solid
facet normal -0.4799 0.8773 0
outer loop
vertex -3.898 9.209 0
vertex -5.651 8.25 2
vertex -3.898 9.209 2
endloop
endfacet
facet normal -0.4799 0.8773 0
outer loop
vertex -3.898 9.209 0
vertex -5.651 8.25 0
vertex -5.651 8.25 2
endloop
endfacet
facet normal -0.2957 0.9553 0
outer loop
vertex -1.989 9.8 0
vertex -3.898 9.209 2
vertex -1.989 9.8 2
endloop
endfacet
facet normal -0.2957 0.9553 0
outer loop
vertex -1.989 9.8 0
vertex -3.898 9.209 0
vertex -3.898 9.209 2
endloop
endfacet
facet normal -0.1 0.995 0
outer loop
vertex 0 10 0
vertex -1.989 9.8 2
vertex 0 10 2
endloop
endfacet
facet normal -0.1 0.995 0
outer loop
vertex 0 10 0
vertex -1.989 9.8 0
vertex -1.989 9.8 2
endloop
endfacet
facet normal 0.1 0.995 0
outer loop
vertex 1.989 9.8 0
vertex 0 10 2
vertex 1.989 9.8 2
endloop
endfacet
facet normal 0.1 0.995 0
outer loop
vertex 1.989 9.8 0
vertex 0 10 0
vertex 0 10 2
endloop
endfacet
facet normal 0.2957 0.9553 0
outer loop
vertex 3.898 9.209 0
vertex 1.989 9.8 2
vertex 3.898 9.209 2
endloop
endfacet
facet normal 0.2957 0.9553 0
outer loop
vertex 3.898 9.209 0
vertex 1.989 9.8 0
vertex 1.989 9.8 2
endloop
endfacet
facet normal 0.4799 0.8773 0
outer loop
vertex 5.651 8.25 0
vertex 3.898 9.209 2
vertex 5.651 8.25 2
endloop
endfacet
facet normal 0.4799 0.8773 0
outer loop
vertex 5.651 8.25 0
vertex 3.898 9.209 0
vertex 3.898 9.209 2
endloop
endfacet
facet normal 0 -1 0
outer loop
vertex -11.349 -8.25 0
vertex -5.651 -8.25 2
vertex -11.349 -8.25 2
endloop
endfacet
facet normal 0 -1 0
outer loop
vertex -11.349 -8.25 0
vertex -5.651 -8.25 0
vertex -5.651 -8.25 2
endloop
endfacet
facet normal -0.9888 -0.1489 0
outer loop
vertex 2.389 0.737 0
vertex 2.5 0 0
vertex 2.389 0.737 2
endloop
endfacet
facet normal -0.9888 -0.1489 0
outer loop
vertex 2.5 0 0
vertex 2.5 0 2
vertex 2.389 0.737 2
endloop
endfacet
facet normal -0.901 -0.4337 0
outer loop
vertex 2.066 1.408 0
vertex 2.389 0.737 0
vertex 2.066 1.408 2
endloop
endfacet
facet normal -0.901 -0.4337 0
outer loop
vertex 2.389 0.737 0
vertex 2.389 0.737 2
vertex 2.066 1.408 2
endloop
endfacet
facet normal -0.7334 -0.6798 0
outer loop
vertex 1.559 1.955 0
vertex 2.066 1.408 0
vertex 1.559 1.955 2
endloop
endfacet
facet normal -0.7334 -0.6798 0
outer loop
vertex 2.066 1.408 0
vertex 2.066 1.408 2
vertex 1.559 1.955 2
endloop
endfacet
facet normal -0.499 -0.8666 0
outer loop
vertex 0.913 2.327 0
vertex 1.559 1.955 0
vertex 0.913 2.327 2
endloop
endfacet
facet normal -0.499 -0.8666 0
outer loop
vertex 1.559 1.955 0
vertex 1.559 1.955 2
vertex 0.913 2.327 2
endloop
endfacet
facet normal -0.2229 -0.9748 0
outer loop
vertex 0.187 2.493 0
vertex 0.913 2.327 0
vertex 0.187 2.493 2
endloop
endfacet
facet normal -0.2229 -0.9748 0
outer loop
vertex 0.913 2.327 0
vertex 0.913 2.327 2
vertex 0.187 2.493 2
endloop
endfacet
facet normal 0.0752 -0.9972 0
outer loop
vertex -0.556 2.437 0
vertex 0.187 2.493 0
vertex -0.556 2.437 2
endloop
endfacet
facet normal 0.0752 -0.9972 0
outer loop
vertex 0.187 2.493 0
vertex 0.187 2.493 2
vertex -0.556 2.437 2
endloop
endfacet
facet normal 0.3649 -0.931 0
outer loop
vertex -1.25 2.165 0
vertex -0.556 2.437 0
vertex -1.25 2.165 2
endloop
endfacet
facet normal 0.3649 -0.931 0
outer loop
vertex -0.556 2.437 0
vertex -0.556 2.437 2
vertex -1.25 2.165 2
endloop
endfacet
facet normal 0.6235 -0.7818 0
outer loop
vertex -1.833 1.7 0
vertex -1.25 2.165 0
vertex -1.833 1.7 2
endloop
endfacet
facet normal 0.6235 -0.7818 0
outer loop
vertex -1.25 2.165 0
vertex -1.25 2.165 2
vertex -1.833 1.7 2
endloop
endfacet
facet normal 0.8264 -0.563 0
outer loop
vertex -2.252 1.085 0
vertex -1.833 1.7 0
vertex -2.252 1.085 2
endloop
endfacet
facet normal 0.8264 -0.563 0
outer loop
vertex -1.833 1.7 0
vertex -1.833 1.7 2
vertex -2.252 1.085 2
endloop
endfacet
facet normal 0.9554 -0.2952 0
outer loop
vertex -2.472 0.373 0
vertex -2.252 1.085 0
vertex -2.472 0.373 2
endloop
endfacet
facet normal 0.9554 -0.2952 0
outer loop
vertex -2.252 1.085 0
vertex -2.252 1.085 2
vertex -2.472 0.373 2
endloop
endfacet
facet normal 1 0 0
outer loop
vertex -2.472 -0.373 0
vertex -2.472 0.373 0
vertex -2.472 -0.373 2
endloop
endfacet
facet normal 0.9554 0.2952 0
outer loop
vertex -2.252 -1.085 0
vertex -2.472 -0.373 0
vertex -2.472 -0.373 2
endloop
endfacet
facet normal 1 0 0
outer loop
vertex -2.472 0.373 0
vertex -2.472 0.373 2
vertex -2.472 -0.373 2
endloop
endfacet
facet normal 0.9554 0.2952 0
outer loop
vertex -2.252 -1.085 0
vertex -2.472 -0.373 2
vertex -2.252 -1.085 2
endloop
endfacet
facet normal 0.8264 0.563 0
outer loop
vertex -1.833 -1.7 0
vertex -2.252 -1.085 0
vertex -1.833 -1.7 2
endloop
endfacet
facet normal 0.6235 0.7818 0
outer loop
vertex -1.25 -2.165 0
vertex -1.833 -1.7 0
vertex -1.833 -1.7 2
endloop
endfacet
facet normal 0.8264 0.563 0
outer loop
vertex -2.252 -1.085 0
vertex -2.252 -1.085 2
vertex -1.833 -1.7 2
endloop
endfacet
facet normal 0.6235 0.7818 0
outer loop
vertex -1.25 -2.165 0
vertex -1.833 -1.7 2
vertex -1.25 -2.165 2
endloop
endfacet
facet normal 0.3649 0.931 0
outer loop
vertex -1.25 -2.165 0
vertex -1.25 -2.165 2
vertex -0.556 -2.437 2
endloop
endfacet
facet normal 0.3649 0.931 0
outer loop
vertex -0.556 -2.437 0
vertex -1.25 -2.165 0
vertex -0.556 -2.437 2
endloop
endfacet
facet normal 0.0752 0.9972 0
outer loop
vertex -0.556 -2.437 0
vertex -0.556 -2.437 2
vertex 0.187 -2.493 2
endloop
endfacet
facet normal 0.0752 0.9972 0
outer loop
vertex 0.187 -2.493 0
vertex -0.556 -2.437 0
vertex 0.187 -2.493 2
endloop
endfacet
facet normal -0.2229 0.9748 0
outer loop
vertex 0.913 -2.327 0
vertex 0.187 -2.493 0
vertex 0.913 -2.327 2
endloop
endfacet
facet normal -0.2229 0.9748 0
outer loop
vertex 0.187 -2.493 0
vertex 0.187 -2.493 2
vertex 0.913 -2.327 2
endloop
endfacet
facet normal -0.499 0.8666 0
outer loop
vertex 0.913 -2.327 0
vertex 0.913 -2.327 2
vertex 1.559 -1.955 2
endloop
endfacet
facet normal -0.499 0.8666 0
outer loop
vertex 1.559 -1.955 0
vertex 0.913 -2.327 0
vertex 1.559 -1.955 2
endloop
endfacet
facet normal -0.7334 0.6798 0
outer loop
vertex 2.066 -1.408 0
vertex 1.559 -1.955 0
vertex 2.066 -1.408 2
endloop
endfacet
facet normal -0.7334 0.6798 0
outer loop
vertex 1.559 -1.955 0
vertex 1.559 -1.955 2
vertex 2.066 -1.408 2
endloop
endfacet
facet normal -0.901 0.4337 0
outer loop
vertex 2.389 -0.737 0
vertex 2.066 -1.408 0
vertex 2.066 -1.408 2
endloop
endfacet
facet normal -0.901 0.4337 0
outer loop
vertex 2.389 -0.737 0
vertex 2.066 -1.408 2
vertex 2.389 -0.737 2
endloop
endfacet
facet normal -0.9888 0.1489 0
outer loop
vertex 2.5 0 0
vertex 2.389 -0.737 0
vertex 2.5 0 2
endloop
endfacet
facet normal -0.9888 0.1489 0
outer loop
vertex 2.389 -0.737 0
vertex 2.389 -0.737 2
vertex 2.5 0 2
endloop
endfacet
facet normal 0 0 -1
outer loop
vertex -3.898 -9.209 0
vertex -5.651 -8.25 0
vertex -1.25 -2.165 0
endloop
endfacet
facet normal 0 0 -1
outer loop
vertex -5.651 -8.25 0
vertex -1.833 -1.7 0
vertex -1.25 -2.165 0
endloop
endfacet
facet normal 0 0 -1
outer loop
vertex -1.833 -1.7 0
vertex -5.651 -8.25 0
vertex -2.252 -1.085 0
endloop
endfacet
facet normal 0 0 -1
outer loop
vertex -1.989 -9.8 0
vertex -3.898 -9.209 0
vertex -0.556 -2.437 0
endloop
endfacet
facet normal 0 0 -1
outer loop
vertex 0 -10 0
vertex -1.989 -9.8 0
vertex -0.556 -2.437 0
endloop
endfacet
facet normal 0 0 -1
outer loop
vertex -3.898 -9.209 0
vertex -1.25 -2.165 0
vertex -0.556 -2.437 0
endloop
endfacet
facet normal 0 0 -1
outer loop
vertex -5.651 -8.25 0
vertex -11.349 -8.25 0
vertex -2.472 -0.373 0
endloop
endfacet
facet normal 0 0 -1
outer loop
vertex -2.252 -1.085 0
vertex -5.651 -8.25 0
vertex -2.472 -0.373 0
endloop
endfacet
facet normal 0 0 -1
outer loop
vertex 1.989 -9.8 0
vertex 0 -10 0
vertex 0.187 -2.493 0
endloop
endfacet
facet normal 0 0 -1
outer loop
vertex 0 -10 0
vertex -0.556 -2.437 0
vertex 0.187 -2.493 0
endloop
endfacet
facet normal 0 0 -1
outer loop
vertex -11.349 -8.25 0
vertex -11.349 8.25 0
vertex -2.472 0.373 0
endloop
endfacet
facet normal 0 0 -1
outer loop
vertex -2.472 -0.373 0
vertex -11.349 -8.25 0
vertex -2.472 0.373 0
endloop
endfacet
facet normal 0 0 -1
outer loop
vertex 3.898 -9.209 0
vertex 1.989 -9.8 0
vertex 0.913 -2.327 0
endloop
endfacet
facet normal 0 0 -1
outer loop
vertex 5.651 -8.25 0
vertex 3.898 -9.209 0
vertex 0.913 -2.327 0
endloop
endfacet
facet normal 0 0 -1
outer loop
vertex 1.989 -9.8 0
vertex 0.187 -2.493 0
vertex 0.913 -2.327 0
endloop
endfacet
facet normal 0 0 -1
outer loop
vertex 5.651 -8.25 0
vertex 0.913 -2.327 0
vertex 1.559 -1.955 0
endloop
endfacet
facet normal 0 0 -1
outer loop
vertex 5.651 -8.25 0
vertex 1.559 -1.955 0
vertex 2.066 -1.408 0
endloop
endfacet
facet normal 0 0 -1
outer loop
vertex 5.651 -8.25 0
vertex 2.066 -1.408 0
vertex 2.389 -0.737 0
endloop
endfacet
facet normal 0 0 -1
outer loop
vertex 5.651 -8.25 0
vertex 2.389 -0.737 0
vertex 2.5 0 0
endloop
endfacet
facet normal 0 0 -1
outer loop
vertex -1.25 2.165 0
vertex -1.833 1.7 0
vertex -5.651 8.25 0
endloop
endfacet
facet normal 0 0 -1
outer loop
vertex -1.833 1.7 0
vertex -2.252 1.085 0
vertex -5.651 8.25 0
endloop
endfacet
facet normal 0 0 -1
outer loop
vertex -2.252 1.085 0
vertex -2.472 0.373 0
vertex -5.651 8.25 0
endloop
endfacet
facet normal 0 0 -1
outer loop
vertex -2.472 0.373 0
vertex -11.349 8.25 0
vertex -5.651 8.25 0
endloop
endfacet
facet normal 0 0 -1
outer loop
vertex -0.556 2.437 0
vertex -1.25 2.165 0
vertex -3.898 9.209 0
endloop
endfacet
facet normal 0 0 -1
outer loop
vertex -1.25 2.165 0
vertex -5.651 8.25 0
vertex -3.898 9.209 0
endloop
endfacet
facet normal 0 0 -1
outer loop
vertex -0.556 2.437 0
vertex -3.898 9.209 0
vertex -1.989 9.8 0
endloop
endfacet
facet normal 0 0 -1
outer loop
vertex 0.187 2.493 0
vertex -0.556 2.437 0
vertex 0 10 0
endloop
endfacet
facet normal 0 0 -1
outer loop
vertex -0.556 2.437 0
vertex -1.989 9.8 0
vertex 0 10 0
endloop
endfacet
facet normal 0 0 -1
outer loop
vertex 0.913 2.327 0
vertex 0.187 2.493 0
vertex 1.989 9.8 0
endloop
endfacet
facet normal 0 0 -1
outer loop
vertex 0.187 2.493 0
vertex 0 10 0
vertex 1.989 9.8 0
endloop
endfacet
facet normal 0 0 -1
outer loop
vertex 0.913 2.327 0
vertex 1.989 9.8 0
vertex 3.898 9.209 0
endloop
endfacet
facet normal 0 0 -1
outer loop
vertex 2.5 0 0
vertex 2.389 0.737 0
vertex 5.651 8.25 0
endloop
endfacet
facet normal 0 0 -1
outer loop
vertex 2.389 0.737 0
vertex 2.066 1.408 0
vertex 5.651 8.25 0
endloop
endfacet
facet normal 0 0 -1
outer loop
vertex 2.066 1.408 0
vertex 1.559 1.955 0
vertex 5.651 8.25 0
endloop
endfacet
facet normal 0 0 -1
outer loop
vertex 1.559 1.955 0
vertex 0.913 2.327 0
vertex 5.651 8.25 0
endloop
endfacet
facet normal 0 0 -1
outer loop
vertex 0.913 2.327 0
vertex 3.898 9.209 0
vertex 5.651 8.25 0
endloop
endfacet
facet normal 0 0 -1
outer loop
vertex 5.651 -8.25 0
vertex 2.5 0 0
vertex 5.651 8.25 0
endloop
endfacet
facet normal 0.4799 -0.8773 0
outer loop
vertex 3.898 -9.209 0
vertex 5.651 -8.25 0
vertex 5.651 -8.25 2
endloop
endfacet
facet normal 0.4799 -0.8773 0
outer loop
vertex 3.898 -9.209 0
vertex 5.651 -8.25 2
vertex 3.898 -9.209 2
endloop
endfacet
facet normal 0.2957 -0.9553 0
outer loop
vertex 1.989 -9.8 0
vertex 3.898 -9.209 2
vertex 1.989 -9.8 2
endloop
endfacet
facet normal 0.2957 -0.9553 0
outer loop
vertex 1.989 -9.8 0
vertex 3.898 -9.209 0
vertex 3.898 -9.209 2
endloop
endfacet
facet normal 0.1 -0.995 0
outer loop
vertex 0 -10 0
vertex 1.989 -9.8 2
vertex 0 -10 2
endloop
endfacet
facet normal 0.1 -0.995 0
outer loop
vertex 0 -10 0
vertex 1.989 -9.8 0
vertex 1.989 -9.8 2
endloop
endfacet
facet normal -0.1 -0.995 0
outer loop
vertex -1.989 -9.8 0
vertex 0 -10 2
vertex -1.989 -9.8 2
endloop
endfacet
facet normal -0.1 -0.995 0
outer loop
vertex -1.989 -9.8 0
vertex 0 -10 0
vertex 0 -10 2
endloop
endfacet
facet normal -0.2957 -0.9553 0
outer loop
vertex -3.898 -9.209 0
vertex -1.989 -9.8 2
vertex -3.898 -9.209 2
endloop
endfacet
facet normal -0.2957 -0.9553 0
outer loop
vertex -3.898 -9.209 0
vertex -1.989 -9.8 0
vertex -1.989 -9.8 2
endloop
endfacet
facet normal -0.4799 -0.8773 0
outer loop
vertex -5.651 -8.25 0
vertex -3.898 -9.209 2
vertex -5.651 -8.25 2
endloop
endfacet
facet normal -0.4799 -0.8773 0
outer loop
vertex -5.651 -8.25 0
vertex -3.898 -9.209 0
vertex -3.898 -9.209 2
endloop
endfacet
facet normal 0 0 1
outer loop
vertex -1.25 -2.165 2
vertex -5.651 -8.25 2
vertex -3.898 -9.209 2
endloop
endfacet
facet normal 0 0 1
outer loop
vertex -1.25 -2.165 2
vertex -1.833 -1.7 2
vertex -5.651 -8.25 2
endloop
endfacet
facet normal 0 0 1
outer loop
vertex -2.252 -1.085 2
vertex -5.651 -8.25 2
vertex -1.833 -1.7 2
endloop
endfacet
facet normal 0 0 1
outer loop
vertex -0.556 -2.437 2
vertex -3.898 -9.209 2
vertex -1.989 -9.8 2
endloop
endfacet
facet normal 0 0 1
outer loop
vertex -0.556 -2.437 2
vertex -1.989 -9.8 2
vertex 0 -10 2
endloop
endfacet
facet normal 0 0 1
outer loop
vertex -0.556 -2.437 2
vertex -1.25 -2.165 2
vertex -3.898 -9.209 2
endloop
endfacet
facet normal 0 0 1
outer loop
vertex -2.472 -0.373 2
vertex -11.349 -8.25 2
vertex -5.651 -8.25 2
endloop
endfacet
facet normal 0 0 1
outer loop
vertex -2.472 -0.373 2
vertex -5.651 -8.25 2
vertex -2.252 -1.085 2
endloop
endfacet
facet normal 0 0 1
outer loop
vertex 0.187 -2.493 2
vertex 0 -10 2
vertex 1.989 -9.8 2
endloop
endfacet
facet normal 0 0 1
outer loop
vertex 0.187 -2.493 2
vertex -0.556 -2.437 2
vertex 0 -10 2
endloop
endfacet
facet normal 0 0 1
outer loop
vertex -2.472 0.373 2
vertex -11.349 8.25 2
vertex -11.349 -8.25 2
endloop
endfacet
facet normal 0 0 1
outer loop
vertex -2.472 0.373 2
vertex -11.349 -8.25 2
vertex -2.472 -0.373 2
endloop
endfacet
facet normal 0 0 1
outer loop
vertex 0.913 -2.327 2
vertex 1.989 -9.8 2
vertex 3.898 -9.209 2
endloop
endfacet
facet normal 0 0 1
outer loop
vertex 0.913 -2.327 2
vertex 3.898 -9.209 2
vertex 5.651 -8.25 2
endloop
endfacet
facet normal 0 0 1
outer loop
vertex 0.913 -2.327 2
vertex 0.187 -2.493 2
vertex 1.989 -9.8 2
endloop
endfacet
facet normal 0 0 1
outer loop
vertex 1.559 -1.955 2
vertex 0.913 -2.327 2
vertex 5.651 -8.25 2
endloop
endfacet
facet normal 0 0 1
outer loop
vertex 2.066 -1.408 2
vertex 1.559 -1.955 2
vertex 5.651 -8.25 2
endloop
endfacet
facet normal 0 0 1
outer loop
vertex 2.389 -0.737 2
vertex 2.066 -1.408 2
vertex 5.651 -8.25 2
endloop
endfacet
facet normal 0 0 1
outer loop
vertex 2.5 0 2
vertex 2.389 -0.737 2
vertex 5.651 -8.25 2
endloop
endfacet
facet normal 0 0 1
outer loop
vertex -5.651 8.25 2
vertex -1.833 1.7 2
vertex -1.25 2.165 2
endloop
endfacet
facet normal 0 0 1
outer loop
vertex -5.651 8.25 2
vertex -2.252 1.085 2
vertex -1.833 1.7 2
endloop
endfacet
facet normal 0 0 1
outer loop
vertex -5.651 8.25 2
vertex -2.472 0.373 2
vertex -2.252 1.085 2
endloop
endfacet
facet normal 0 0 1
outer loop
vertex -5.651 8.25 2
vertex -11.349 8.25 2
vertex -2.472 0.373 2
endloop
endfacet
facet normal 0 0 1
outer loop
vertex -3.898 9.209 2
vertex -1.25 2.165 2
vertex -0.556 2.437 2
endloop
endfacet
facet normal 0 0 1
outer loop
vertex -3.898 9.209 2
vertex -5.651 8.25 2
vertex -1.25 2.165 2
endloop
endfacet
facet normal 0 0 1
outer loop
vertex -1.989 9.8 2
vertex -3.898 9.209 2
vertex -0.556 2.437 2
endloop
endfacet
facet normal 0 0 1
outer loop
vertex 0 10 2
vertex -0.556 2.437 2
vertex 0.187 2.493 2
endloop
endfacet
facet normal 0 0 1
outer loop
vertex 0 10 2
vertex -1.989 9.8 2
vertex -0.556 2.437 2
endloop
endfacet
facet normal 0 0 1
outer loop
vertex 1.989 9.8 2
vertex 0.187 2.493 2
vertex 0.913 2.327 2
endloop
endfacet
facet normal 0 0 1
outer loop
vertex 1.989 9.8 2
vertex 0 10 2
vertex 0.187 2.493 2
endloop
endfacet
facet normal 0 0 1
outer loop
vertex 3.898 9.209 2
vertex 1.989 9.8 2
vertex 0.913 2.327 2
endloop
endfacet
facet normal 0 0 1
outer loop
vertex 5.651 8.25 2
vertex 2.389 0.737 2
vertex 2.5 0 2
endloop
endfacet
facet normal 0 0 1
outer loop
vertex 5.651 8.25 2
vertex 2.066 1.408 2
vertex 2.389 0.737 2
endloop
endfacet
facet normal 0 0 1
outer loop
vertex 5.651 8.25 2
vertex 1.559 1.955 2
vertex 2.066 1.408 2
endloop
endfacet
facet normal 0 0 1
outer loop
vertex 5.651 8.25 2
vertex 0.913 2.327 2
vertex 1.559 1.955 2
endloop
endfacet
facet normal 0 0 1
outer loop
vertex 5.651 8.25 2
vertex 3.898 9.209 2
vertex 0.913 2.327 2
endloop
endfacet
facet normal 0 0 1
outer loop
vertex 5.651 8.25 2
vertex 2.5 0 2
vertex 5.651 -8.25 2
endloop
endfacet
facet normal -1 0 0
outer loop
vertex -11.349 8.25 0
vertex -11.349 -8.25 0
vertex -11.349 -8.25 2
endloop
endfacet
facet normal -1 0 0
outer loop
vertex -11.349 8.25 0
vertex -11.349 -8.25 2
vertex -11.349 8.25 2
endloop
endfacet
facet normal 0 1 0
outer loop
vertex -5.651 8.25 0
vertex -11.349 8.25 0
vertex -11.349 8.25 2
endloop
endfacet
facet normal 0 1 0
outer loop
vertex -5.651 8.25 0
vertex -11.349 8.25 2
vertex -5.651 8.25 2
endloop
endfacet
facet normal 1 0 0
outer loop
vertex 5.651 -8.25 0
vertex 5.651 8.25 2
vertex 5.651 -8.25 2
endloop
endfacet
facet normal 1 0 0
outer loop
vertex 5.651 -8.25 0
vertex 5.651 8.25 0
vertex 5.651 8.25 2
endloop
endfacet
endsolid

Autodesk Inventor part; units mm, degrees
ref_plane "YZ Plane" through (0, 0, 0) normal (1, 0, 0) x (0, 1, 0)
ref_plane "XZ Plane" through (0, 0, 0) normal (0, 1, 0) x (-1, 0, 0)
ref_plane "XY Plane" through (0, 0, 0) normal (0, 0, 1) x (1, 0, 0)
sketch "スケッチ1" plane through (0, 0, 0) normal (0, 0, 1) x (1, 0, 0)
  circle A0 centre (0, 0) radius 10
  line L0 (-11.3487, 8.25) -> (5.6513, 8.25)
  line L1 (5.6513, 8.25) -> (5.6513, -8.25)
  line L2 (5.6513, -8.25) -> (-11.3487, -8.25)
  line L3 (-11.3487, -8.25) -> (-11.3487, 8.25)
  point P0 (5.6513, 0)
  point P1 (-5.6513, 8.25)
  point P2 (-5.6513, -8.25)
  dimension "d0" = 20
  dimension "d1" = 16.5
  dimension "d2" = 17
extrude "押し出し1" add sketch "スケッチ1" along normal blind 2 contours L0 A0 | L1 L2 A0 L0 | A0 L2 | A0 L2 L3 L0
sketch "スケッチ2" plane through (0, 0, 2) normal (0, 0, 1) x (1, 0, 0)
  circle A0 centre (0, 0) radius 2.5
  dimension "d5" = 5
extrude "押し出し2" cut sketch "スケッチ2" against normal blind 2
properties part number "encoder"
